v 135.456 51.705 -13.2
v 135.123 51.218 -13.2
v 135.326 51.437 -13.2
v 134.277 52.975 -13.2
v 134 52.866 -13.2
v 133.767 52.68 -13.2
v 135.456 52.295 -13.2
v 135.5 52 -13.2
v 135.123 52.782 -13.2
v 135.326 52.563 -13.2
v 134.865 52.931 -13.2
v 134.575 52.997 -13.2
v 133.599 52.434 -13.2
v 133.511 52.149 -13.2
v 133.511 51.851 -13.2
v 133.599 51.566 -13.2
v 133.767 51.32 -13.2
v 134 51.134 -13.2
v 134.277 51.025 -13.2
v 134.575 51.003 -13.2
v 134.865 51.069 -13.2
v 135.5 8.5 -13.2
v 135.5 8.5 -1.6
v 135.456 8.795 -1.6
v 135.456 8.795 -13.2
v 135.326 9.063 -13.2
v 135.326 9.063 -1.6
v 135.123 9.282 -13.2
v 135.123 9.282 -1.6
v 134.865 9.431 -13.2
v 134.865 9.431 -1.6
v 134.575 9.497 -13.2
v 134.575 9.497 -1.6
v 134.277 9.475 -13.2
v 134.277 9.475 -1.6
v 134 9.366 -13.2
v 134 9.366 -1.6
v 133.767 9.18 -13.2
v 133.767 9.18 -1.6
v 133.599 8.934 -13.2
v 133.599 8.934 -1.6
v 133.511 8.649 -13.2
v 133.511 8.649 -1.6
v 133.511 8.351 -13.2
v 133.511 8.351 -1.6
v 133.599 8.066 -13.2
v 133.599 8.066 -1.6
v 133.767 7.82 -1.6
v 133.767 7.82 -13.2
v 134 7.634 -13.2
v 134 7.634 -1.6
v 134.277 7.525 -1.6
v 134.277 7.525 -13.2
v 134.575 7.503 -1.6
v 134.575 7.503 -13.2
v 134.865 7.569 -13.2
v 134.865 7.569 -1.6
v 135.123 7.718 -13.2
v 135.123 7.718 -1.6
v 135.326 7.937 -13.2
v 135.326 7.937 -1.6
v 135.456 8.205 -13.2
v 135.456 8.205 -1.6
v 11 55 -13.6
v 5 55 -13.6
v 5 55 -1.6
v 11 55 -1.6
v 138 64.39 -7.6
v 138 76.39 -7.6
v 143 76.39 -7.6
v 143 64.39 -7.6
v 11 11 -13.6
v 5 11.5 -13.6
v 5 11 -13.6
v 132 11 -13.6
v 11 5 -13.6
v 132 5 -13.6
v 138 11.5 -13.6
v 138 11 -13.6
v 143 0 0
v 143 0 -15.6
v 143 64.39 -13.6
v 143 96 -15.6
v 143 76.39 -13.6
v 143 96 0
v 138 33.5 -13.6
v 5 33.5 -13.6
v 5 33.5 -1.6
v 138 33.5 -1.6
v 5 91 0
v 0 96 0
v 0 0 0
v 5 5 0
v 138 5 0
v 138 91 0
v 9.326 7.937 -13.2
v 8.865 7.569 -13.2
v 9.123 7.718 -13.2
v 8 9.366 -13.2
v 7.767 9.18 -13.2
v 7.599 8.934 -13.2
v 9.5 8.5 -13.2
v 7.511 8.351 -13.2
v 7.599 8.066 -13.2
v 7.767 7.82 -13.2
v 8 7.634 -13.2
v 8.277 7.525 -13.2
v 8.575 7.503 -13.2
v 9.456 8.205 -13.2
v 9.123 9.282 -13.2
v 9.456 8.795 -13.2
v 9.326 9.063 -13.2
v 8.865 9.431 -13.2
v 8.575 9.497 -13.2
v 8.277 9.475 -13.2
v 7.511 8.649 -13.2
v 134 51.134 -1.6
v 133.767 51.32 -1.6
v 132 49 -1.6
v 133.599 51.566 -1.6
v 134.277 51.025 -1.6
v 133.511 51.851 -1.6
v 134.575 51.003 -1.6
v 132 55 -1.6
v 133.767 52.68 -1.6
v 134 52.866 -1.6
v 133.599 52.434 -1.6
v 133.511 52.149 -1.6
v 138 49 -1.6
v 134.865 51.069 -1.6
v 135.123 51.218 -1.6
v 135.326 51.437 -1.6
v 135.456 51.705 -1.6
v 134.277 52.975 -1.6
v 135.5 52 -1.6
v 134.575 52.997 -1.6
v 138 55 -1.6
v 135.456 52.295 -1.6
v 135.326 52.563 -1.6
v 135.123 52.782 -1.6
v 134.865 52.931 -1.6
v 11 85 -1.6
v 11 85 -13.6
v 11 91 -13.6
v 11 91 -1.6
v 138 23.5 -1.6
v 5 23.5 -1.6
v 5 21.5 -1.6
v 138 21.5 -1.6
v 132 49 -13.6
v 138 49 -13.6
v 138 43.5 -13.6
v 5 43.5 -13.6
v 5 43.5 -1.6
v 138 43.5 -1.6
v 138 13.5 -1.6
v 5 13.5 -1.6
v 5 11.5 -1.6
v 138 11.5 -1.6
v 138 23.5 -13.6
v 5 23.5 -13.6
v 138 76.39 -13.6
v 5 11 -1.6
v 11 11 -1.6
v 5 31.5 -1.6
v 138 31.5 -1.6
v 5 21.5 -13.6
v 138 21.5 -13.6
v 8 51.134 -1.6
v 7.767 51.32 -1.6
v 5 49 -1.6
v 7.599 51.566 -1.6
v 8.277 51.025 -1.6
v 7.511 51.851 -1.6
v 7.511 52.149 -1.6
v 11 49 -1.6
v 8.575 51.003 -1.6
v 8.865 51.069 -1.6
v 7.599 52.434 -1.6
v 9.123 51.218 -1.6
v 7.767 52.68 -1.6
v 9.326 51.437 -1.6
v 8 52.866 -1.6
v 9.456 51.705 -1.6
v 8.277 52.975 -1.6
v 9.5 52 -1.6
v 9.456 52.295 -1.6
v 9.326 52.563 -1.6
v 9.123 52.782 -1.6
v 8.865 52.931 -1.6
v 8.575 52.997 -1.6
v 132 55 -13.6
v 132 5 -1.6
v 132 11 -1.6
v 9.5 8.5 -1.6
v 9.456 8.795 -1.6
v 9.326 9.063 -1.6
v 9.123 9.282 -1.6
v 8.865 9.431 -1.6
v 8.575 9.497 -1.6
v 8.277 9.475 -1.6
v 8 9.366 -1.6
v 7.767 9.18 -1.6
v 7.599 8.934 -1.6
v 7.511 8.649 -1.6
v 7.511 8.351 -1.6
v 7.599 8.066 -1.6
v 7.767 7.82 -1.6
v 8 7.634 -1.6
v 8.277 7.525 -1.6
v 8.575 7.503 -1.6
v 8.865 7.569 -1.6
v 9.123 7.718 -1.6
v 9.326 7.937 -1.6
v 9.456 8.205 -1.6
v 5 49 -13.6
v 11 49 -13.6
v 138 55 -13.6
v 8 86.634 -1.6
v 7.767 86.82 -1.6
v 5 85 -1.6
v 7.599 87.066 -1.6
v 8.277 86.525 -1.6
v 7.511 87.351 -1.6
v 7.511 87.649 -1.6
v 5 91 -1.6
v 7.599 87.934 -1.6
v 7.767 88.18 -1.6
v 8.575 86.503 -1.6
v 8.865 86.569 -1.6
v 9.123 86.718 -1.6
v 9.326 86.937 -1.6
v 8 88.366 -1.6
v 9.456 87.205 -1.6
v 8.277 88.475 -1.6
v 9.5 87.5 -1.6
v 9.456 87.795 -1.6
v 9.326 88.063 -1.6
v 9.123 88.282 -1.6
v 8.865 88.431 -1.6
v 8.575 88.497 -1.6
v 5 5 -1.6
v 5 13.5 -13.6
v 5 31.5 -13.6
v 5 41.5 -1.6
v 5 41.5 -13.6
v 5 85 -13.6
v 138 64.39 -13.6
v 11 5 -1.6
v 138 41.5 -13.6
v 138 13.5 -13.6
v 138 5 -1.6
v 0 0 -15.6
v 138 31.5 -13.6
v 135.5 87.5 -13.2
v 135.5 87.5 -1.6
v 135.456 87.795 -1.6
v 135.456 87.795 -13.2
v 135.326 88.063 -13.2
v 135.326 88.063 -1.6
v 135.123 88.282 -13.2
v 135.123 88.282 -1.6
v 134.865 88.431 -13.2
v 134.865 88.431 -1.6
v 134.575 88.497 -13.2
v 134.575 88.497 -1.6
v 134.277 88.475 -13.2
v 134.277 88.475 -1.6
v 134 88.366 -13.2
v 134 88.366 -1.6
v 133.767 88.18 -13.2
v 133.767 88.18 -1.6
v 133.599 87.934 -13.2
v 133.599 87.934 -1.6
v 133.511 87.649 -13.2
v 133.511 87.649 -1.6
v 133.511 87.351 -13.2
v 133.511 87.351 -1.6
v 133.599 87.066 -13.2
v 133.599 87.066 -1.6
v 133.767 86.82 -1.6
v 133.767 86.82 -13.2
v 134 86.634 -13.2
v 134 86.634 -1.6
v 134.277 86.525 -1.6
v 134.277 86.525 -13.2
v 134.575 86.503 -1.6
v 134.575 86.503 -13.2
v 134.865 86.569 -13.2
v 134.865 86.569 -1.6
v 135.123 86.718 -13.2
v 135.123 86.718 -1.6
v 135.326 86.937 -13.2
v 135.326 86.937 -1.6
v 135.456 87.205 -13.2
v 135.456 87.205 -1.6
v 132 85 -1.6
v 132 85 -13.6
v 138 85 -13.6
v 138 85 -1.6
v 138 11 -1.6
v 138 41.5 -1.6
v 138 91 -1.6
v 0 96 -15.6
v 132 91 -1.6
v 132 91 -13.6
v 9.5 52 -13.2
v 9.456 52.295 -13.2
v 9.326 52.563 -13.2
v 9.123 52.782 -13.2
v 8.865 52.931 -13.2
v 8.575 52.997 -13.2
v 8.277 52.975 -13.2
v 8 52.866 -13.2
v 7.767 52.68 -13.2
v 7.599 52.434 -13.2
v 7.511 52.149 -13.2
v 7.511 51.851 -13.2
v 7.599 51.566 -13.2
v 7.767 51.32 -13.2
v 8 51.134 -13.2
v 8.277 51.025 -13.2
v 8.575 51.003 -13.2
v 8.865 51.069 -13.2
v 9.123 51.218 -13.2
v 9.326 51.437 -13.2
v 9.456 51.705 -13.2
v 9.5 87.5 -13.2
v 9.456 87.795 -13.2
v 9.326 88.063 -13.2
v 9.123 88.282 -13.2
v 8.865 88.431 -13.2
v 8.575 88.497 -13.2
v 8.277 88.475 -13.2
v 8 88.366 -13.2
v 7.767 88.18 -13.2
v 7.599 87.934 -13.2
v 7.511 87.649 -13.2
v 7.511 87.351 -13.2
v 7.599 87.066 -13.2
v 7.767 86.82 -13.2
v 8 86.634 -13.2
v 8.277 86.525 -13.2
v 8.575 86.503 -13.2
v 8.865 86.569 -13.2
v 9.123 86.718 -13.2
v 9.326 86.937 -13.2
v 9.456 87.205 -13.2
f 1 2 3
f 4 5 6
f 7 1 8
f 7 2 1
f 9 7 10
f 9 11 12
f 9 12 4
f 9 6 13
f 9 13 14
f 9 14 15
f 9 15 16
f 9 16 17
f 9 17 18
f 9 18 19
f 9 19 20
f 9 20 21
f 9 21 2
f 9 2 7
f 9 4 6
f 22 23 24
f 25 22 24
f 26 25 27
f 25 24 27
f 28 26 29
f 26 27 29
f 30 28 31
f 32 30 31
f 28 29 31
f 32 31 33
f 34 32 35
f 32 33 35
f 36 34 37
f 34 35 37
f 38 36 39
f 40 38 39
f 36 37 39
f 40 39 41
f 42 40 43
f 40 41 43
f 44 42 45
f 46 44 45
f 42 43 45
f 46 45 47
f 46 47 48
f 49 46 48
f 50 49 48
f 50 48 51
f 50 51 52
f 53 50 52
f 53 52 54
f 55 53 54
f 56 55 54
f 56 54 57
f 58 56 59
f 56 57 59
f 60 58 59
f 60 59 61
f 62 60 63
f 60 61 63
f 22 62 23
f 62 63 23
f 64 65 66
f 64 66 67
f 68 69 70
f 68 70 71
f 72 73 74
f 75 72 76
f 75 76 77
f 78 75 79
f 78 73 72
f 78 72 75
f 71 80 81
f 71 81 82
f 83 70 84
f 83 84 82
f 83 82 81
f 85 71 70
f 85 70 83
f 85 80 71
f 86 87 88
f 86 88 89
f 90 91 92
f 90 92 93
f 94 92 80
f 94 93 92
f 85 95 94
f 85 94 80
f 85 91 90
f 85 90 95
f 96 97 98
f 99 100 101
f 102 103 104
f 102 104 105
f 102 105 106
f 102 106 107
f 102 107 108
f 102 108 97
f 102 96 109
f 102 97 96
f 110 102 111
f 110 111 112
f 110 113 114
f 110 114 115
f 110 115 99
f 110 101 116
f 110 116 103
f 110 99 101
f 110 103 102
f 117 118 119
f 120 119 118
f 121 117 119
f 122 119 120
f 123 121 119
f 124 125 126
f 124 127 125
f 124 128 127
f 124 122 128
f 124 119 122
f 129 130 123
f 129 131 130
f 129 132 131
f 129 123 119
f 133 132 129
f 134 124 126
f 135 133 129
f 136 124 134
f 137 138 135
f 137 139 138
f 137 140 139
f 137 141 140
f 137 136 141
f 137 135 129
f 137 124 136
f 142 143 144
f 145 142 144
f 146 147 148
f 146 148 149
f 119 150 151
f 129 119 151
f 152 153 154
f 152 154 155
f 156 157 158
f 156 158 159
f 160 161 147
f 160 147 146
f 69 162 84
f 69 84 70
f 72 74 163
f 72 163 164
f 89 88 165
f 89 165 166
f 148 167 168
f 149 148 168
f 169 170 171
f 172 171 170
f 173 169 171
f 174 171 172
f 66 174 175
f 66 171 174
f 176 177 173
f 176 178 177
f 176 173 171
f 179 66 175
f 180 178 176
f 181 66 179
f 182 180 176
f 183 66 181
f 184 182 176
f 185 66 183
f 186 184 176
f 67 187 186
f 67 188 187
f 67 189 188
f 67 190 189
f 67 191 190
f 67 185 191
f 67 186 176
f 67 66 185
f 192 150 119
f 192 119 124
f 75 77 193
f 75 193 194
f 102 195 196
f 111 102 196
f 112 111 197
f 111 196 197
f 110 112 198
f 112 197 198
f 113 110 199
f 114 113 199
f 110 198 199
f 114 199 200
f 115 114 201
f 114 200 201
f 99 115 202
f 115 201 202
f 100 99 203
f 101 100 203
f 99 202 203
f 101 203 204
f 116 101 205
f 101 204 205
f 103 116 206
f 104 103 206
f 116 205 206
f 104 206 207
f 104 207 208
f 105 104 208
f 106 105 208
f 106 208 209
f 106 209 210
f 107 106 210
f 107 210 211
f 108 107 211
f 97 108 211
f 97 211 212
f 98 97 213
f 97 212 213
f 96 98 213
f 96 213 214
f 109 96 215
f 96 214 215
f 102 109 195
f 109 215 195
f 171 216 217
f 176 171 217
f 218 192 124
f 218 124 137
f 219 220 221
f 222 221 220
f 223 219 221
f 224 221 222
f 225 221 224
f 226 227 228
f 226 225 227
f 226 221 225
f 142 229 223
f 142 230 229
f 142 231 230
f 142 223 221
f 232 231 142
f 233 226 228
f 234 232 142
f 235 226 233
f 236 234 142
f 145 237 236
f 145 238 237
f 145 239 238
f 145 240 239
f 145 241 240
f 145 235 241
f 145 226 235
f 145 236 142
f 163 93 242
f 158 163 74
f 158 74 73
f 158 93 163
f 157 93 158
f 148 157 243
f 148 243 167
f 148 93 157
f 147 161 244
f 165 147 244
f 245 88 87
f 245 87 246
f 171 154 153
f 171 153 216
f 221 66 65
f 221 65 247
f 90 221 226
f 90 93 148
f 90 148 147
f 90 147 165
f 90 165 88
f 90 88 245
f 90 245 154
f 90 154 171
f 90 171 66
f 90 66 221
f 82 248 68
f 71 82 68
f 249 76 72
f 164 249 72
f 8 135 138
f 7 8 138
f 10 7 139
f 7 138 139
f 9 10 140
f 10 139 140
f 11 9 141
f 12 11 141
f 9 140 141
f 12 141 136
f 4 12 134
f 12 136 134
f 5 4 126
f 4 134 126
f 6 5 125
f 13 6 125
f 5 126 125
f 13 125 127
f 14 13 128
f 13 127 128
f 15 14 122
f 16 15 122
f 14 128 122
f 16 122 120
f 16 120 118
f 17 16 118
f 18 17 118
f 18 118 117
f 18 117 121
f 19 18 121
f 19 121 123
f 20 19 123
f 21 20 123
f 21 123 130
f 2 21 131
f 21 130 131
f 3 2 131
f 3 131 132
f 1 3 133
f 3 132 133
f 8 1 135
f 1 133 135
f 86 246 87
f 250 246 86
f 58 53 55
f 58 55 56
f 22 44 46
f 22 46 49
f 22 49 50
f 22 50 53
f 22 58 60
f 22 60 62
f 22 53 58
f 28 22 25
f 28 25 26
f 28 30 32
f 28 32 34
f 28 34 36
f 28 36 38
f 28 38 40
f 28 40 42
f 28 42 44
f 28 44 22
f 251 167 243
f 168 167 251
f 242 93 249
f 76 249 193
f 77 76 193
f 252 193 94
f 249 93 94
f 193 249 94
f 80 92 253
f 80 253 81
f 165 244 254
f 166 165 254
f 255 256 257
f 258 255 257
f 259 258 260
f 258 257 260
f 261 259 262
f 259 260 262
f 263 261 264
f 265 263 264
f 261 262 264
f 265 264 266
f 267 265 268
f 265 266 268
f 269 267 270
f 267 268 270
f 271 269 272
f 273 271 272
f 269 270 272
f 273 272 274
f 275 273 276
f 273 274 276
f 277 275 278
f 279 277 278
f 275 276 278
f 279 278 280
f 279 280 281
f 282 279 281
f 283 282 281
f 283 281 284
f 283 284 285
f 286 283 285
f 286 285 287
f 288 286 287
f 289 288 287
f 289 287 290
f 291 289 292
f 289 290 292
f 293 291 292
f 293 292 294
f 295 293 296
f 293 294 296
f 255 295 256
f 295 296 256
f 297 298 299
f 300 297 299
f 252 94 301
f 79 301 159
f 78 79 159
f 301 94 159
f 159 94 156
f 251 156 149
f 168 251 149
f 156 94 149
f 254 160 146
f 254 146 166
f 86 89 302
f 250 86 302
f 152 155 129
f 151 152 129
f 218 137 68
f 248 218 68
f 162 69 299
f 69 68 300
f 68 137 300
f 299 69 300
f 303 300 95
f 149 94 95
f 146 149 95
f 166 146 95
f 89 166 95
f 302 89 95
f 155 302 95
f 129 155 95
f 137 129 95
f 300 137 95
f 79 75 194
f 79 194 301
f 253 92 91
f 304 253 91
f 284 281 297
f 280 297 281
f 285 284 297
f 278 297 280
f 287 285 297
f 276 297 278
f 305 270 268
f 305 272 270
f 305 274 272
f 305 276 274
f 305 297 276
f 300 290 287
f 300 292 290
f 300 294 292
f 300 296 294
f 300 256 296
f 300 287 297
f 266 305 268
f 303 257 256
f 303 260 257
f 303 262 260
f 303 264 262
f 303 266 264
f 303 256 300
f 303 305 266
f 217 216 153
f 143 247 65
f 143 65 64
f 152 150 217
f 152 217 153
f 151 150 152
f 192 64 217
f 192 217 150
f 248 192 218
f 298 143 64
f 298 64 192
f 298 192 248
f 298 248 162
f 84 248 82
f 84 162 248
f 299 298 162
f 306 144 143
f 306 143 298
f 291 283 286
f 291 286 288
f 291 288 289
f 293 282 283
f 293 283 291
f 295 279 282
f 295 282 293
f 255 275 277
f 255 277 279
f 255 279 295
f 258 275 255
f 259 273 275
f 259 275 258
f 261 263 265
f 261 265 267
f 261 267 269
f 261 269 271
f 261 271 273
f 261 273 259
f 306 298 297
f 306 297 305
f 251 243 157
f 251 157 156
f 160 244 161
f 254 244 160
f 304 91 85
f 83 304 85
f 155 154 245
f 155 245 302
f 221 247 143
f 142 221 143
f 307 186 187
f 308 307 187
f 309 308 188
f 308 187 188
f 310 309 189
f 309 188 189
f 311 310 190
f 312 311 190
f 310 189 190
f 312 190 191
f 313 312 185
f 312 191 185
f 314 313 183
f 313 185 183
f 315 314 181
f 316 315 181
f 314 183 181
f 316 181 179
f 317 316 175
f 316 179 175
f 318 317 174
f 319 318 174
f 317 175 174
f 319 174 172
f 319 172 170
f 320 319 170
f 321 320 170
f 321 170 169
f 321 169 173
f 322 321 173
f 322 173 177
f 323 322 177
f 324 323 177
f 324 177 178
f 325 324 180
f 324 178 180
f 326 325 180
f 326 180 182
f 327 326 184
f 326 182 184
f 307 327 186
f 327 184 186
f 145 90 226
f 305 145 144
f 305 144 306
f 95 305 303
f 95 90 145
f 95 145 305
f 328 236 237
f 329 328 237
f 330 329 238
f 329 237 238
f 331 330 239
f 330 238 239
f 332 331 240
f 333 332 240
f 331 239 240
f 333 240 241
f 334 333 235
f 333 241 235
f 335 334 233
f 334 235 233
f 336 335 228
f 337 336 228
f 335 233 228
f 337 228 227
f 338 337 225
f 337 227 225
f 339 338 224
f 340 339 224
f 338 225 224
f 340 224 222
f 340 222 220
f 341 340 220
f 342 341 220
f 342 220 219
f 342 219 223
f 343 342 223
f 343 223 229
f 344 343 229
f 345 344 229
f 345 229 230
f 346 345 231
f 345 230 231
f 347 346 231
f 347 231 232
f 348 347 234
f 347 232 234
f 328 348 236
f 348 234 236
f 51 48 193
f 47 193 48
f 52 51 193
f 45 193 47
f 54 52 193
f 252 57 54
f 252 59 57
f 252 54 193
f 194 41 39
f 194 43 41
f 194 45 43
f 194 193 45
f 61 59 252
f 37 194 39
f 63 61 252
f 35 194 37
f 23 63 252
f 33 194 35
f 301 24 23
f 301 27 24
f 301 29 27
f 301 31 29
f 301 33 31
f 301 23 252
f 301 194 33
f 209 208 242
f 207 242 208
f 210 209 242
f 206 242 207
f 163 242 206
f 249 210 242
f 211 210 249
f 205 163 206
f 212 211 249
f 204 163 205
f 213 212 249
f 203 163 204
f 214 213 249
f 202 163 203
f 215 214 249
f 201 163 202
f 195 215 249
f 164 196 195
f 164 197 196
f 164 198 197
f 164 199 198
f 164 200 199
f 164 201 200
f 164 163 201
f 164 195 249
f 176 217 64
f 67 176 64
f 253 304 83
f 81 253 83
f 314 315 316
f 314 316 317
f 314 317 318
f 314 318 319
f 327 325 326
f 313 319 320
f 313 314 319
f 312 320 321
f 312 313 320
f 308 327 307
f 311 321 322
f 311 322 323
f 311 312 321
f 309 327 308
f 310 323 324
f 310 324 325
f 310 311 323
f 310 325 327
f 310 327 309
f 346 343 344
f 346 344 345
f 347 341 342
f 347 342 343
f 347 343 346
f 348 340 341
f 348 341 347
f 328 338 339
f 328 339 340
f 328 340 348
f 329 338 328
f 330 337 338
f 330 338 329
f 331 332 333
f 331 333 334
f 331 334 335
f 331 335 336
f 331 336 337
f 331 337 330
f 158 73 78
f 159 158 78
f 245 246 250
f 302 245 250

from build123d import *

# Parameters (mm, degrees)
SKETCH_W        = 143
SKETCH_H        = 96
PAD_DEPTH       = 15.6
SKETCH001_W     = 133
SKETCH001_H     = 86
POCKET_DEPTH    = 13.6
SKETCH002_W     = 6
SKETCH002_H     = 6
PAD001_DEPTH    = 12
SKETCH003_R     = 1
POCKET001_DEPTH = 11.6
SKETCH004_W     = 12
SKETCH004_H     = 6
POCKET002_DEPTH = 5.001
SKETCH005_W     = 133
SKETCH005_H     = 2
PAD002_DEPTH    = 12


with BuildPart() as part:
    # Sketch → Pad (new body)
    with BuildSketch(Plane.XY):
        with Locations((71.5, 48)):
            Rectangle(SKETCH_W, SKETCH_H)
    extrude(amount=-PAD_DEPTH)

    # Sketch001 (on Face5 of Pad) → Pocket (cut)
    with BuildSketch(Plane.XY):
        with Locations((71.5, 48)):
            Rectangle(SKETCH001_W, SKETCH001_H)
    extrude(amount=-POCKET_DEPTH, mode=Mode.SUBTRACT)

    # Sketch002 (on Face11 of Pocket) → Pad001 (join)
    with BuildSketch(Plane.XY.offset(-13.6)):
        with Locations((8, 8)):
            Rectangle(SKETCH002_W, SKETCH002_H)
        with Locations((135, 8)):
            Rectangle(SKETCH002_W, SKETCH002_H)
        with Locations((8, 52)):
            Rectangle(SKETCH002_W, SKETCH002_H)
        with Locations((135, 52)):
            Rectangle(SKETCH002_W, SKETCH002_H)
        with Locations((8, 88)):
            Rectangle(SKETCH002_W, SKETCH002_H)
        with Locations((135, 88)):
            Rectangle(SKETCH002_W, SKETCH002_H)
    extrude(amount=PAD001_DEPTH)

    # Sketch003 (on Face18 of Pad001) → Pocket001 (cut)
    with BuildSketch(Plane.XY.offset(-1.6)):
        with Locations((8.5, 87.5)):
            Circle(SKETCH003_R)
        with Locations((8.5, 52)):
            Circle(SKETCH003_R)
        with Locations((8.5, 8.5)):
            Circle(SKETCH003_R)
        with Locations((134.5, 87.5)):
            Circle(SKETCH003_R)
        with Locations((134.5, 52)):
            Circle(SKETCH003_R)
        with Locations((134.5, 8.5)):
            Circle(SKETCH003_R)
    extrude(amount=-POCKET001_DEPTH, mode=Mode.SUBTRACT)

    # Sketch004 (on Face9 of Pocket001) → Pocket002 (cut, through all)
    with BuildSketch(Plane(origin=(138, 0, 0), x_dir=(0, -1, 0), z_dir=(-1, 0, 0))):
        with Locations((-70.39, -10.6)):
            Rectangle(SKETCH004_W, SKETCH004_H)
    extrude(amount=-POCKET002_DEPTH, mode=Mode.SUBTRACT)

    # Sketch005 (on Face17 of Pocket002) → Pad002 (join)
    with BuildSketch(Plane.XY.offset(-13.6)):
        with Locations((71.5, 12.5)):
            Rectangle(SKETCH005_W, SKETCH005_H)
        with Locations((71.5, 22.5)):
            Rectangle(SKETCH005_W, SKETCH005_H)
        with Locations((71.5, 32.5)):
            Rectangle(SKETCH005_W, SKETCH005_H)
        with Locations((71.5, 42.5)):
            Rectangle(SKETCH005_W, SKETCH005_H)
    extrude(amount=PAD002_DEPTH)


solid = part.part
